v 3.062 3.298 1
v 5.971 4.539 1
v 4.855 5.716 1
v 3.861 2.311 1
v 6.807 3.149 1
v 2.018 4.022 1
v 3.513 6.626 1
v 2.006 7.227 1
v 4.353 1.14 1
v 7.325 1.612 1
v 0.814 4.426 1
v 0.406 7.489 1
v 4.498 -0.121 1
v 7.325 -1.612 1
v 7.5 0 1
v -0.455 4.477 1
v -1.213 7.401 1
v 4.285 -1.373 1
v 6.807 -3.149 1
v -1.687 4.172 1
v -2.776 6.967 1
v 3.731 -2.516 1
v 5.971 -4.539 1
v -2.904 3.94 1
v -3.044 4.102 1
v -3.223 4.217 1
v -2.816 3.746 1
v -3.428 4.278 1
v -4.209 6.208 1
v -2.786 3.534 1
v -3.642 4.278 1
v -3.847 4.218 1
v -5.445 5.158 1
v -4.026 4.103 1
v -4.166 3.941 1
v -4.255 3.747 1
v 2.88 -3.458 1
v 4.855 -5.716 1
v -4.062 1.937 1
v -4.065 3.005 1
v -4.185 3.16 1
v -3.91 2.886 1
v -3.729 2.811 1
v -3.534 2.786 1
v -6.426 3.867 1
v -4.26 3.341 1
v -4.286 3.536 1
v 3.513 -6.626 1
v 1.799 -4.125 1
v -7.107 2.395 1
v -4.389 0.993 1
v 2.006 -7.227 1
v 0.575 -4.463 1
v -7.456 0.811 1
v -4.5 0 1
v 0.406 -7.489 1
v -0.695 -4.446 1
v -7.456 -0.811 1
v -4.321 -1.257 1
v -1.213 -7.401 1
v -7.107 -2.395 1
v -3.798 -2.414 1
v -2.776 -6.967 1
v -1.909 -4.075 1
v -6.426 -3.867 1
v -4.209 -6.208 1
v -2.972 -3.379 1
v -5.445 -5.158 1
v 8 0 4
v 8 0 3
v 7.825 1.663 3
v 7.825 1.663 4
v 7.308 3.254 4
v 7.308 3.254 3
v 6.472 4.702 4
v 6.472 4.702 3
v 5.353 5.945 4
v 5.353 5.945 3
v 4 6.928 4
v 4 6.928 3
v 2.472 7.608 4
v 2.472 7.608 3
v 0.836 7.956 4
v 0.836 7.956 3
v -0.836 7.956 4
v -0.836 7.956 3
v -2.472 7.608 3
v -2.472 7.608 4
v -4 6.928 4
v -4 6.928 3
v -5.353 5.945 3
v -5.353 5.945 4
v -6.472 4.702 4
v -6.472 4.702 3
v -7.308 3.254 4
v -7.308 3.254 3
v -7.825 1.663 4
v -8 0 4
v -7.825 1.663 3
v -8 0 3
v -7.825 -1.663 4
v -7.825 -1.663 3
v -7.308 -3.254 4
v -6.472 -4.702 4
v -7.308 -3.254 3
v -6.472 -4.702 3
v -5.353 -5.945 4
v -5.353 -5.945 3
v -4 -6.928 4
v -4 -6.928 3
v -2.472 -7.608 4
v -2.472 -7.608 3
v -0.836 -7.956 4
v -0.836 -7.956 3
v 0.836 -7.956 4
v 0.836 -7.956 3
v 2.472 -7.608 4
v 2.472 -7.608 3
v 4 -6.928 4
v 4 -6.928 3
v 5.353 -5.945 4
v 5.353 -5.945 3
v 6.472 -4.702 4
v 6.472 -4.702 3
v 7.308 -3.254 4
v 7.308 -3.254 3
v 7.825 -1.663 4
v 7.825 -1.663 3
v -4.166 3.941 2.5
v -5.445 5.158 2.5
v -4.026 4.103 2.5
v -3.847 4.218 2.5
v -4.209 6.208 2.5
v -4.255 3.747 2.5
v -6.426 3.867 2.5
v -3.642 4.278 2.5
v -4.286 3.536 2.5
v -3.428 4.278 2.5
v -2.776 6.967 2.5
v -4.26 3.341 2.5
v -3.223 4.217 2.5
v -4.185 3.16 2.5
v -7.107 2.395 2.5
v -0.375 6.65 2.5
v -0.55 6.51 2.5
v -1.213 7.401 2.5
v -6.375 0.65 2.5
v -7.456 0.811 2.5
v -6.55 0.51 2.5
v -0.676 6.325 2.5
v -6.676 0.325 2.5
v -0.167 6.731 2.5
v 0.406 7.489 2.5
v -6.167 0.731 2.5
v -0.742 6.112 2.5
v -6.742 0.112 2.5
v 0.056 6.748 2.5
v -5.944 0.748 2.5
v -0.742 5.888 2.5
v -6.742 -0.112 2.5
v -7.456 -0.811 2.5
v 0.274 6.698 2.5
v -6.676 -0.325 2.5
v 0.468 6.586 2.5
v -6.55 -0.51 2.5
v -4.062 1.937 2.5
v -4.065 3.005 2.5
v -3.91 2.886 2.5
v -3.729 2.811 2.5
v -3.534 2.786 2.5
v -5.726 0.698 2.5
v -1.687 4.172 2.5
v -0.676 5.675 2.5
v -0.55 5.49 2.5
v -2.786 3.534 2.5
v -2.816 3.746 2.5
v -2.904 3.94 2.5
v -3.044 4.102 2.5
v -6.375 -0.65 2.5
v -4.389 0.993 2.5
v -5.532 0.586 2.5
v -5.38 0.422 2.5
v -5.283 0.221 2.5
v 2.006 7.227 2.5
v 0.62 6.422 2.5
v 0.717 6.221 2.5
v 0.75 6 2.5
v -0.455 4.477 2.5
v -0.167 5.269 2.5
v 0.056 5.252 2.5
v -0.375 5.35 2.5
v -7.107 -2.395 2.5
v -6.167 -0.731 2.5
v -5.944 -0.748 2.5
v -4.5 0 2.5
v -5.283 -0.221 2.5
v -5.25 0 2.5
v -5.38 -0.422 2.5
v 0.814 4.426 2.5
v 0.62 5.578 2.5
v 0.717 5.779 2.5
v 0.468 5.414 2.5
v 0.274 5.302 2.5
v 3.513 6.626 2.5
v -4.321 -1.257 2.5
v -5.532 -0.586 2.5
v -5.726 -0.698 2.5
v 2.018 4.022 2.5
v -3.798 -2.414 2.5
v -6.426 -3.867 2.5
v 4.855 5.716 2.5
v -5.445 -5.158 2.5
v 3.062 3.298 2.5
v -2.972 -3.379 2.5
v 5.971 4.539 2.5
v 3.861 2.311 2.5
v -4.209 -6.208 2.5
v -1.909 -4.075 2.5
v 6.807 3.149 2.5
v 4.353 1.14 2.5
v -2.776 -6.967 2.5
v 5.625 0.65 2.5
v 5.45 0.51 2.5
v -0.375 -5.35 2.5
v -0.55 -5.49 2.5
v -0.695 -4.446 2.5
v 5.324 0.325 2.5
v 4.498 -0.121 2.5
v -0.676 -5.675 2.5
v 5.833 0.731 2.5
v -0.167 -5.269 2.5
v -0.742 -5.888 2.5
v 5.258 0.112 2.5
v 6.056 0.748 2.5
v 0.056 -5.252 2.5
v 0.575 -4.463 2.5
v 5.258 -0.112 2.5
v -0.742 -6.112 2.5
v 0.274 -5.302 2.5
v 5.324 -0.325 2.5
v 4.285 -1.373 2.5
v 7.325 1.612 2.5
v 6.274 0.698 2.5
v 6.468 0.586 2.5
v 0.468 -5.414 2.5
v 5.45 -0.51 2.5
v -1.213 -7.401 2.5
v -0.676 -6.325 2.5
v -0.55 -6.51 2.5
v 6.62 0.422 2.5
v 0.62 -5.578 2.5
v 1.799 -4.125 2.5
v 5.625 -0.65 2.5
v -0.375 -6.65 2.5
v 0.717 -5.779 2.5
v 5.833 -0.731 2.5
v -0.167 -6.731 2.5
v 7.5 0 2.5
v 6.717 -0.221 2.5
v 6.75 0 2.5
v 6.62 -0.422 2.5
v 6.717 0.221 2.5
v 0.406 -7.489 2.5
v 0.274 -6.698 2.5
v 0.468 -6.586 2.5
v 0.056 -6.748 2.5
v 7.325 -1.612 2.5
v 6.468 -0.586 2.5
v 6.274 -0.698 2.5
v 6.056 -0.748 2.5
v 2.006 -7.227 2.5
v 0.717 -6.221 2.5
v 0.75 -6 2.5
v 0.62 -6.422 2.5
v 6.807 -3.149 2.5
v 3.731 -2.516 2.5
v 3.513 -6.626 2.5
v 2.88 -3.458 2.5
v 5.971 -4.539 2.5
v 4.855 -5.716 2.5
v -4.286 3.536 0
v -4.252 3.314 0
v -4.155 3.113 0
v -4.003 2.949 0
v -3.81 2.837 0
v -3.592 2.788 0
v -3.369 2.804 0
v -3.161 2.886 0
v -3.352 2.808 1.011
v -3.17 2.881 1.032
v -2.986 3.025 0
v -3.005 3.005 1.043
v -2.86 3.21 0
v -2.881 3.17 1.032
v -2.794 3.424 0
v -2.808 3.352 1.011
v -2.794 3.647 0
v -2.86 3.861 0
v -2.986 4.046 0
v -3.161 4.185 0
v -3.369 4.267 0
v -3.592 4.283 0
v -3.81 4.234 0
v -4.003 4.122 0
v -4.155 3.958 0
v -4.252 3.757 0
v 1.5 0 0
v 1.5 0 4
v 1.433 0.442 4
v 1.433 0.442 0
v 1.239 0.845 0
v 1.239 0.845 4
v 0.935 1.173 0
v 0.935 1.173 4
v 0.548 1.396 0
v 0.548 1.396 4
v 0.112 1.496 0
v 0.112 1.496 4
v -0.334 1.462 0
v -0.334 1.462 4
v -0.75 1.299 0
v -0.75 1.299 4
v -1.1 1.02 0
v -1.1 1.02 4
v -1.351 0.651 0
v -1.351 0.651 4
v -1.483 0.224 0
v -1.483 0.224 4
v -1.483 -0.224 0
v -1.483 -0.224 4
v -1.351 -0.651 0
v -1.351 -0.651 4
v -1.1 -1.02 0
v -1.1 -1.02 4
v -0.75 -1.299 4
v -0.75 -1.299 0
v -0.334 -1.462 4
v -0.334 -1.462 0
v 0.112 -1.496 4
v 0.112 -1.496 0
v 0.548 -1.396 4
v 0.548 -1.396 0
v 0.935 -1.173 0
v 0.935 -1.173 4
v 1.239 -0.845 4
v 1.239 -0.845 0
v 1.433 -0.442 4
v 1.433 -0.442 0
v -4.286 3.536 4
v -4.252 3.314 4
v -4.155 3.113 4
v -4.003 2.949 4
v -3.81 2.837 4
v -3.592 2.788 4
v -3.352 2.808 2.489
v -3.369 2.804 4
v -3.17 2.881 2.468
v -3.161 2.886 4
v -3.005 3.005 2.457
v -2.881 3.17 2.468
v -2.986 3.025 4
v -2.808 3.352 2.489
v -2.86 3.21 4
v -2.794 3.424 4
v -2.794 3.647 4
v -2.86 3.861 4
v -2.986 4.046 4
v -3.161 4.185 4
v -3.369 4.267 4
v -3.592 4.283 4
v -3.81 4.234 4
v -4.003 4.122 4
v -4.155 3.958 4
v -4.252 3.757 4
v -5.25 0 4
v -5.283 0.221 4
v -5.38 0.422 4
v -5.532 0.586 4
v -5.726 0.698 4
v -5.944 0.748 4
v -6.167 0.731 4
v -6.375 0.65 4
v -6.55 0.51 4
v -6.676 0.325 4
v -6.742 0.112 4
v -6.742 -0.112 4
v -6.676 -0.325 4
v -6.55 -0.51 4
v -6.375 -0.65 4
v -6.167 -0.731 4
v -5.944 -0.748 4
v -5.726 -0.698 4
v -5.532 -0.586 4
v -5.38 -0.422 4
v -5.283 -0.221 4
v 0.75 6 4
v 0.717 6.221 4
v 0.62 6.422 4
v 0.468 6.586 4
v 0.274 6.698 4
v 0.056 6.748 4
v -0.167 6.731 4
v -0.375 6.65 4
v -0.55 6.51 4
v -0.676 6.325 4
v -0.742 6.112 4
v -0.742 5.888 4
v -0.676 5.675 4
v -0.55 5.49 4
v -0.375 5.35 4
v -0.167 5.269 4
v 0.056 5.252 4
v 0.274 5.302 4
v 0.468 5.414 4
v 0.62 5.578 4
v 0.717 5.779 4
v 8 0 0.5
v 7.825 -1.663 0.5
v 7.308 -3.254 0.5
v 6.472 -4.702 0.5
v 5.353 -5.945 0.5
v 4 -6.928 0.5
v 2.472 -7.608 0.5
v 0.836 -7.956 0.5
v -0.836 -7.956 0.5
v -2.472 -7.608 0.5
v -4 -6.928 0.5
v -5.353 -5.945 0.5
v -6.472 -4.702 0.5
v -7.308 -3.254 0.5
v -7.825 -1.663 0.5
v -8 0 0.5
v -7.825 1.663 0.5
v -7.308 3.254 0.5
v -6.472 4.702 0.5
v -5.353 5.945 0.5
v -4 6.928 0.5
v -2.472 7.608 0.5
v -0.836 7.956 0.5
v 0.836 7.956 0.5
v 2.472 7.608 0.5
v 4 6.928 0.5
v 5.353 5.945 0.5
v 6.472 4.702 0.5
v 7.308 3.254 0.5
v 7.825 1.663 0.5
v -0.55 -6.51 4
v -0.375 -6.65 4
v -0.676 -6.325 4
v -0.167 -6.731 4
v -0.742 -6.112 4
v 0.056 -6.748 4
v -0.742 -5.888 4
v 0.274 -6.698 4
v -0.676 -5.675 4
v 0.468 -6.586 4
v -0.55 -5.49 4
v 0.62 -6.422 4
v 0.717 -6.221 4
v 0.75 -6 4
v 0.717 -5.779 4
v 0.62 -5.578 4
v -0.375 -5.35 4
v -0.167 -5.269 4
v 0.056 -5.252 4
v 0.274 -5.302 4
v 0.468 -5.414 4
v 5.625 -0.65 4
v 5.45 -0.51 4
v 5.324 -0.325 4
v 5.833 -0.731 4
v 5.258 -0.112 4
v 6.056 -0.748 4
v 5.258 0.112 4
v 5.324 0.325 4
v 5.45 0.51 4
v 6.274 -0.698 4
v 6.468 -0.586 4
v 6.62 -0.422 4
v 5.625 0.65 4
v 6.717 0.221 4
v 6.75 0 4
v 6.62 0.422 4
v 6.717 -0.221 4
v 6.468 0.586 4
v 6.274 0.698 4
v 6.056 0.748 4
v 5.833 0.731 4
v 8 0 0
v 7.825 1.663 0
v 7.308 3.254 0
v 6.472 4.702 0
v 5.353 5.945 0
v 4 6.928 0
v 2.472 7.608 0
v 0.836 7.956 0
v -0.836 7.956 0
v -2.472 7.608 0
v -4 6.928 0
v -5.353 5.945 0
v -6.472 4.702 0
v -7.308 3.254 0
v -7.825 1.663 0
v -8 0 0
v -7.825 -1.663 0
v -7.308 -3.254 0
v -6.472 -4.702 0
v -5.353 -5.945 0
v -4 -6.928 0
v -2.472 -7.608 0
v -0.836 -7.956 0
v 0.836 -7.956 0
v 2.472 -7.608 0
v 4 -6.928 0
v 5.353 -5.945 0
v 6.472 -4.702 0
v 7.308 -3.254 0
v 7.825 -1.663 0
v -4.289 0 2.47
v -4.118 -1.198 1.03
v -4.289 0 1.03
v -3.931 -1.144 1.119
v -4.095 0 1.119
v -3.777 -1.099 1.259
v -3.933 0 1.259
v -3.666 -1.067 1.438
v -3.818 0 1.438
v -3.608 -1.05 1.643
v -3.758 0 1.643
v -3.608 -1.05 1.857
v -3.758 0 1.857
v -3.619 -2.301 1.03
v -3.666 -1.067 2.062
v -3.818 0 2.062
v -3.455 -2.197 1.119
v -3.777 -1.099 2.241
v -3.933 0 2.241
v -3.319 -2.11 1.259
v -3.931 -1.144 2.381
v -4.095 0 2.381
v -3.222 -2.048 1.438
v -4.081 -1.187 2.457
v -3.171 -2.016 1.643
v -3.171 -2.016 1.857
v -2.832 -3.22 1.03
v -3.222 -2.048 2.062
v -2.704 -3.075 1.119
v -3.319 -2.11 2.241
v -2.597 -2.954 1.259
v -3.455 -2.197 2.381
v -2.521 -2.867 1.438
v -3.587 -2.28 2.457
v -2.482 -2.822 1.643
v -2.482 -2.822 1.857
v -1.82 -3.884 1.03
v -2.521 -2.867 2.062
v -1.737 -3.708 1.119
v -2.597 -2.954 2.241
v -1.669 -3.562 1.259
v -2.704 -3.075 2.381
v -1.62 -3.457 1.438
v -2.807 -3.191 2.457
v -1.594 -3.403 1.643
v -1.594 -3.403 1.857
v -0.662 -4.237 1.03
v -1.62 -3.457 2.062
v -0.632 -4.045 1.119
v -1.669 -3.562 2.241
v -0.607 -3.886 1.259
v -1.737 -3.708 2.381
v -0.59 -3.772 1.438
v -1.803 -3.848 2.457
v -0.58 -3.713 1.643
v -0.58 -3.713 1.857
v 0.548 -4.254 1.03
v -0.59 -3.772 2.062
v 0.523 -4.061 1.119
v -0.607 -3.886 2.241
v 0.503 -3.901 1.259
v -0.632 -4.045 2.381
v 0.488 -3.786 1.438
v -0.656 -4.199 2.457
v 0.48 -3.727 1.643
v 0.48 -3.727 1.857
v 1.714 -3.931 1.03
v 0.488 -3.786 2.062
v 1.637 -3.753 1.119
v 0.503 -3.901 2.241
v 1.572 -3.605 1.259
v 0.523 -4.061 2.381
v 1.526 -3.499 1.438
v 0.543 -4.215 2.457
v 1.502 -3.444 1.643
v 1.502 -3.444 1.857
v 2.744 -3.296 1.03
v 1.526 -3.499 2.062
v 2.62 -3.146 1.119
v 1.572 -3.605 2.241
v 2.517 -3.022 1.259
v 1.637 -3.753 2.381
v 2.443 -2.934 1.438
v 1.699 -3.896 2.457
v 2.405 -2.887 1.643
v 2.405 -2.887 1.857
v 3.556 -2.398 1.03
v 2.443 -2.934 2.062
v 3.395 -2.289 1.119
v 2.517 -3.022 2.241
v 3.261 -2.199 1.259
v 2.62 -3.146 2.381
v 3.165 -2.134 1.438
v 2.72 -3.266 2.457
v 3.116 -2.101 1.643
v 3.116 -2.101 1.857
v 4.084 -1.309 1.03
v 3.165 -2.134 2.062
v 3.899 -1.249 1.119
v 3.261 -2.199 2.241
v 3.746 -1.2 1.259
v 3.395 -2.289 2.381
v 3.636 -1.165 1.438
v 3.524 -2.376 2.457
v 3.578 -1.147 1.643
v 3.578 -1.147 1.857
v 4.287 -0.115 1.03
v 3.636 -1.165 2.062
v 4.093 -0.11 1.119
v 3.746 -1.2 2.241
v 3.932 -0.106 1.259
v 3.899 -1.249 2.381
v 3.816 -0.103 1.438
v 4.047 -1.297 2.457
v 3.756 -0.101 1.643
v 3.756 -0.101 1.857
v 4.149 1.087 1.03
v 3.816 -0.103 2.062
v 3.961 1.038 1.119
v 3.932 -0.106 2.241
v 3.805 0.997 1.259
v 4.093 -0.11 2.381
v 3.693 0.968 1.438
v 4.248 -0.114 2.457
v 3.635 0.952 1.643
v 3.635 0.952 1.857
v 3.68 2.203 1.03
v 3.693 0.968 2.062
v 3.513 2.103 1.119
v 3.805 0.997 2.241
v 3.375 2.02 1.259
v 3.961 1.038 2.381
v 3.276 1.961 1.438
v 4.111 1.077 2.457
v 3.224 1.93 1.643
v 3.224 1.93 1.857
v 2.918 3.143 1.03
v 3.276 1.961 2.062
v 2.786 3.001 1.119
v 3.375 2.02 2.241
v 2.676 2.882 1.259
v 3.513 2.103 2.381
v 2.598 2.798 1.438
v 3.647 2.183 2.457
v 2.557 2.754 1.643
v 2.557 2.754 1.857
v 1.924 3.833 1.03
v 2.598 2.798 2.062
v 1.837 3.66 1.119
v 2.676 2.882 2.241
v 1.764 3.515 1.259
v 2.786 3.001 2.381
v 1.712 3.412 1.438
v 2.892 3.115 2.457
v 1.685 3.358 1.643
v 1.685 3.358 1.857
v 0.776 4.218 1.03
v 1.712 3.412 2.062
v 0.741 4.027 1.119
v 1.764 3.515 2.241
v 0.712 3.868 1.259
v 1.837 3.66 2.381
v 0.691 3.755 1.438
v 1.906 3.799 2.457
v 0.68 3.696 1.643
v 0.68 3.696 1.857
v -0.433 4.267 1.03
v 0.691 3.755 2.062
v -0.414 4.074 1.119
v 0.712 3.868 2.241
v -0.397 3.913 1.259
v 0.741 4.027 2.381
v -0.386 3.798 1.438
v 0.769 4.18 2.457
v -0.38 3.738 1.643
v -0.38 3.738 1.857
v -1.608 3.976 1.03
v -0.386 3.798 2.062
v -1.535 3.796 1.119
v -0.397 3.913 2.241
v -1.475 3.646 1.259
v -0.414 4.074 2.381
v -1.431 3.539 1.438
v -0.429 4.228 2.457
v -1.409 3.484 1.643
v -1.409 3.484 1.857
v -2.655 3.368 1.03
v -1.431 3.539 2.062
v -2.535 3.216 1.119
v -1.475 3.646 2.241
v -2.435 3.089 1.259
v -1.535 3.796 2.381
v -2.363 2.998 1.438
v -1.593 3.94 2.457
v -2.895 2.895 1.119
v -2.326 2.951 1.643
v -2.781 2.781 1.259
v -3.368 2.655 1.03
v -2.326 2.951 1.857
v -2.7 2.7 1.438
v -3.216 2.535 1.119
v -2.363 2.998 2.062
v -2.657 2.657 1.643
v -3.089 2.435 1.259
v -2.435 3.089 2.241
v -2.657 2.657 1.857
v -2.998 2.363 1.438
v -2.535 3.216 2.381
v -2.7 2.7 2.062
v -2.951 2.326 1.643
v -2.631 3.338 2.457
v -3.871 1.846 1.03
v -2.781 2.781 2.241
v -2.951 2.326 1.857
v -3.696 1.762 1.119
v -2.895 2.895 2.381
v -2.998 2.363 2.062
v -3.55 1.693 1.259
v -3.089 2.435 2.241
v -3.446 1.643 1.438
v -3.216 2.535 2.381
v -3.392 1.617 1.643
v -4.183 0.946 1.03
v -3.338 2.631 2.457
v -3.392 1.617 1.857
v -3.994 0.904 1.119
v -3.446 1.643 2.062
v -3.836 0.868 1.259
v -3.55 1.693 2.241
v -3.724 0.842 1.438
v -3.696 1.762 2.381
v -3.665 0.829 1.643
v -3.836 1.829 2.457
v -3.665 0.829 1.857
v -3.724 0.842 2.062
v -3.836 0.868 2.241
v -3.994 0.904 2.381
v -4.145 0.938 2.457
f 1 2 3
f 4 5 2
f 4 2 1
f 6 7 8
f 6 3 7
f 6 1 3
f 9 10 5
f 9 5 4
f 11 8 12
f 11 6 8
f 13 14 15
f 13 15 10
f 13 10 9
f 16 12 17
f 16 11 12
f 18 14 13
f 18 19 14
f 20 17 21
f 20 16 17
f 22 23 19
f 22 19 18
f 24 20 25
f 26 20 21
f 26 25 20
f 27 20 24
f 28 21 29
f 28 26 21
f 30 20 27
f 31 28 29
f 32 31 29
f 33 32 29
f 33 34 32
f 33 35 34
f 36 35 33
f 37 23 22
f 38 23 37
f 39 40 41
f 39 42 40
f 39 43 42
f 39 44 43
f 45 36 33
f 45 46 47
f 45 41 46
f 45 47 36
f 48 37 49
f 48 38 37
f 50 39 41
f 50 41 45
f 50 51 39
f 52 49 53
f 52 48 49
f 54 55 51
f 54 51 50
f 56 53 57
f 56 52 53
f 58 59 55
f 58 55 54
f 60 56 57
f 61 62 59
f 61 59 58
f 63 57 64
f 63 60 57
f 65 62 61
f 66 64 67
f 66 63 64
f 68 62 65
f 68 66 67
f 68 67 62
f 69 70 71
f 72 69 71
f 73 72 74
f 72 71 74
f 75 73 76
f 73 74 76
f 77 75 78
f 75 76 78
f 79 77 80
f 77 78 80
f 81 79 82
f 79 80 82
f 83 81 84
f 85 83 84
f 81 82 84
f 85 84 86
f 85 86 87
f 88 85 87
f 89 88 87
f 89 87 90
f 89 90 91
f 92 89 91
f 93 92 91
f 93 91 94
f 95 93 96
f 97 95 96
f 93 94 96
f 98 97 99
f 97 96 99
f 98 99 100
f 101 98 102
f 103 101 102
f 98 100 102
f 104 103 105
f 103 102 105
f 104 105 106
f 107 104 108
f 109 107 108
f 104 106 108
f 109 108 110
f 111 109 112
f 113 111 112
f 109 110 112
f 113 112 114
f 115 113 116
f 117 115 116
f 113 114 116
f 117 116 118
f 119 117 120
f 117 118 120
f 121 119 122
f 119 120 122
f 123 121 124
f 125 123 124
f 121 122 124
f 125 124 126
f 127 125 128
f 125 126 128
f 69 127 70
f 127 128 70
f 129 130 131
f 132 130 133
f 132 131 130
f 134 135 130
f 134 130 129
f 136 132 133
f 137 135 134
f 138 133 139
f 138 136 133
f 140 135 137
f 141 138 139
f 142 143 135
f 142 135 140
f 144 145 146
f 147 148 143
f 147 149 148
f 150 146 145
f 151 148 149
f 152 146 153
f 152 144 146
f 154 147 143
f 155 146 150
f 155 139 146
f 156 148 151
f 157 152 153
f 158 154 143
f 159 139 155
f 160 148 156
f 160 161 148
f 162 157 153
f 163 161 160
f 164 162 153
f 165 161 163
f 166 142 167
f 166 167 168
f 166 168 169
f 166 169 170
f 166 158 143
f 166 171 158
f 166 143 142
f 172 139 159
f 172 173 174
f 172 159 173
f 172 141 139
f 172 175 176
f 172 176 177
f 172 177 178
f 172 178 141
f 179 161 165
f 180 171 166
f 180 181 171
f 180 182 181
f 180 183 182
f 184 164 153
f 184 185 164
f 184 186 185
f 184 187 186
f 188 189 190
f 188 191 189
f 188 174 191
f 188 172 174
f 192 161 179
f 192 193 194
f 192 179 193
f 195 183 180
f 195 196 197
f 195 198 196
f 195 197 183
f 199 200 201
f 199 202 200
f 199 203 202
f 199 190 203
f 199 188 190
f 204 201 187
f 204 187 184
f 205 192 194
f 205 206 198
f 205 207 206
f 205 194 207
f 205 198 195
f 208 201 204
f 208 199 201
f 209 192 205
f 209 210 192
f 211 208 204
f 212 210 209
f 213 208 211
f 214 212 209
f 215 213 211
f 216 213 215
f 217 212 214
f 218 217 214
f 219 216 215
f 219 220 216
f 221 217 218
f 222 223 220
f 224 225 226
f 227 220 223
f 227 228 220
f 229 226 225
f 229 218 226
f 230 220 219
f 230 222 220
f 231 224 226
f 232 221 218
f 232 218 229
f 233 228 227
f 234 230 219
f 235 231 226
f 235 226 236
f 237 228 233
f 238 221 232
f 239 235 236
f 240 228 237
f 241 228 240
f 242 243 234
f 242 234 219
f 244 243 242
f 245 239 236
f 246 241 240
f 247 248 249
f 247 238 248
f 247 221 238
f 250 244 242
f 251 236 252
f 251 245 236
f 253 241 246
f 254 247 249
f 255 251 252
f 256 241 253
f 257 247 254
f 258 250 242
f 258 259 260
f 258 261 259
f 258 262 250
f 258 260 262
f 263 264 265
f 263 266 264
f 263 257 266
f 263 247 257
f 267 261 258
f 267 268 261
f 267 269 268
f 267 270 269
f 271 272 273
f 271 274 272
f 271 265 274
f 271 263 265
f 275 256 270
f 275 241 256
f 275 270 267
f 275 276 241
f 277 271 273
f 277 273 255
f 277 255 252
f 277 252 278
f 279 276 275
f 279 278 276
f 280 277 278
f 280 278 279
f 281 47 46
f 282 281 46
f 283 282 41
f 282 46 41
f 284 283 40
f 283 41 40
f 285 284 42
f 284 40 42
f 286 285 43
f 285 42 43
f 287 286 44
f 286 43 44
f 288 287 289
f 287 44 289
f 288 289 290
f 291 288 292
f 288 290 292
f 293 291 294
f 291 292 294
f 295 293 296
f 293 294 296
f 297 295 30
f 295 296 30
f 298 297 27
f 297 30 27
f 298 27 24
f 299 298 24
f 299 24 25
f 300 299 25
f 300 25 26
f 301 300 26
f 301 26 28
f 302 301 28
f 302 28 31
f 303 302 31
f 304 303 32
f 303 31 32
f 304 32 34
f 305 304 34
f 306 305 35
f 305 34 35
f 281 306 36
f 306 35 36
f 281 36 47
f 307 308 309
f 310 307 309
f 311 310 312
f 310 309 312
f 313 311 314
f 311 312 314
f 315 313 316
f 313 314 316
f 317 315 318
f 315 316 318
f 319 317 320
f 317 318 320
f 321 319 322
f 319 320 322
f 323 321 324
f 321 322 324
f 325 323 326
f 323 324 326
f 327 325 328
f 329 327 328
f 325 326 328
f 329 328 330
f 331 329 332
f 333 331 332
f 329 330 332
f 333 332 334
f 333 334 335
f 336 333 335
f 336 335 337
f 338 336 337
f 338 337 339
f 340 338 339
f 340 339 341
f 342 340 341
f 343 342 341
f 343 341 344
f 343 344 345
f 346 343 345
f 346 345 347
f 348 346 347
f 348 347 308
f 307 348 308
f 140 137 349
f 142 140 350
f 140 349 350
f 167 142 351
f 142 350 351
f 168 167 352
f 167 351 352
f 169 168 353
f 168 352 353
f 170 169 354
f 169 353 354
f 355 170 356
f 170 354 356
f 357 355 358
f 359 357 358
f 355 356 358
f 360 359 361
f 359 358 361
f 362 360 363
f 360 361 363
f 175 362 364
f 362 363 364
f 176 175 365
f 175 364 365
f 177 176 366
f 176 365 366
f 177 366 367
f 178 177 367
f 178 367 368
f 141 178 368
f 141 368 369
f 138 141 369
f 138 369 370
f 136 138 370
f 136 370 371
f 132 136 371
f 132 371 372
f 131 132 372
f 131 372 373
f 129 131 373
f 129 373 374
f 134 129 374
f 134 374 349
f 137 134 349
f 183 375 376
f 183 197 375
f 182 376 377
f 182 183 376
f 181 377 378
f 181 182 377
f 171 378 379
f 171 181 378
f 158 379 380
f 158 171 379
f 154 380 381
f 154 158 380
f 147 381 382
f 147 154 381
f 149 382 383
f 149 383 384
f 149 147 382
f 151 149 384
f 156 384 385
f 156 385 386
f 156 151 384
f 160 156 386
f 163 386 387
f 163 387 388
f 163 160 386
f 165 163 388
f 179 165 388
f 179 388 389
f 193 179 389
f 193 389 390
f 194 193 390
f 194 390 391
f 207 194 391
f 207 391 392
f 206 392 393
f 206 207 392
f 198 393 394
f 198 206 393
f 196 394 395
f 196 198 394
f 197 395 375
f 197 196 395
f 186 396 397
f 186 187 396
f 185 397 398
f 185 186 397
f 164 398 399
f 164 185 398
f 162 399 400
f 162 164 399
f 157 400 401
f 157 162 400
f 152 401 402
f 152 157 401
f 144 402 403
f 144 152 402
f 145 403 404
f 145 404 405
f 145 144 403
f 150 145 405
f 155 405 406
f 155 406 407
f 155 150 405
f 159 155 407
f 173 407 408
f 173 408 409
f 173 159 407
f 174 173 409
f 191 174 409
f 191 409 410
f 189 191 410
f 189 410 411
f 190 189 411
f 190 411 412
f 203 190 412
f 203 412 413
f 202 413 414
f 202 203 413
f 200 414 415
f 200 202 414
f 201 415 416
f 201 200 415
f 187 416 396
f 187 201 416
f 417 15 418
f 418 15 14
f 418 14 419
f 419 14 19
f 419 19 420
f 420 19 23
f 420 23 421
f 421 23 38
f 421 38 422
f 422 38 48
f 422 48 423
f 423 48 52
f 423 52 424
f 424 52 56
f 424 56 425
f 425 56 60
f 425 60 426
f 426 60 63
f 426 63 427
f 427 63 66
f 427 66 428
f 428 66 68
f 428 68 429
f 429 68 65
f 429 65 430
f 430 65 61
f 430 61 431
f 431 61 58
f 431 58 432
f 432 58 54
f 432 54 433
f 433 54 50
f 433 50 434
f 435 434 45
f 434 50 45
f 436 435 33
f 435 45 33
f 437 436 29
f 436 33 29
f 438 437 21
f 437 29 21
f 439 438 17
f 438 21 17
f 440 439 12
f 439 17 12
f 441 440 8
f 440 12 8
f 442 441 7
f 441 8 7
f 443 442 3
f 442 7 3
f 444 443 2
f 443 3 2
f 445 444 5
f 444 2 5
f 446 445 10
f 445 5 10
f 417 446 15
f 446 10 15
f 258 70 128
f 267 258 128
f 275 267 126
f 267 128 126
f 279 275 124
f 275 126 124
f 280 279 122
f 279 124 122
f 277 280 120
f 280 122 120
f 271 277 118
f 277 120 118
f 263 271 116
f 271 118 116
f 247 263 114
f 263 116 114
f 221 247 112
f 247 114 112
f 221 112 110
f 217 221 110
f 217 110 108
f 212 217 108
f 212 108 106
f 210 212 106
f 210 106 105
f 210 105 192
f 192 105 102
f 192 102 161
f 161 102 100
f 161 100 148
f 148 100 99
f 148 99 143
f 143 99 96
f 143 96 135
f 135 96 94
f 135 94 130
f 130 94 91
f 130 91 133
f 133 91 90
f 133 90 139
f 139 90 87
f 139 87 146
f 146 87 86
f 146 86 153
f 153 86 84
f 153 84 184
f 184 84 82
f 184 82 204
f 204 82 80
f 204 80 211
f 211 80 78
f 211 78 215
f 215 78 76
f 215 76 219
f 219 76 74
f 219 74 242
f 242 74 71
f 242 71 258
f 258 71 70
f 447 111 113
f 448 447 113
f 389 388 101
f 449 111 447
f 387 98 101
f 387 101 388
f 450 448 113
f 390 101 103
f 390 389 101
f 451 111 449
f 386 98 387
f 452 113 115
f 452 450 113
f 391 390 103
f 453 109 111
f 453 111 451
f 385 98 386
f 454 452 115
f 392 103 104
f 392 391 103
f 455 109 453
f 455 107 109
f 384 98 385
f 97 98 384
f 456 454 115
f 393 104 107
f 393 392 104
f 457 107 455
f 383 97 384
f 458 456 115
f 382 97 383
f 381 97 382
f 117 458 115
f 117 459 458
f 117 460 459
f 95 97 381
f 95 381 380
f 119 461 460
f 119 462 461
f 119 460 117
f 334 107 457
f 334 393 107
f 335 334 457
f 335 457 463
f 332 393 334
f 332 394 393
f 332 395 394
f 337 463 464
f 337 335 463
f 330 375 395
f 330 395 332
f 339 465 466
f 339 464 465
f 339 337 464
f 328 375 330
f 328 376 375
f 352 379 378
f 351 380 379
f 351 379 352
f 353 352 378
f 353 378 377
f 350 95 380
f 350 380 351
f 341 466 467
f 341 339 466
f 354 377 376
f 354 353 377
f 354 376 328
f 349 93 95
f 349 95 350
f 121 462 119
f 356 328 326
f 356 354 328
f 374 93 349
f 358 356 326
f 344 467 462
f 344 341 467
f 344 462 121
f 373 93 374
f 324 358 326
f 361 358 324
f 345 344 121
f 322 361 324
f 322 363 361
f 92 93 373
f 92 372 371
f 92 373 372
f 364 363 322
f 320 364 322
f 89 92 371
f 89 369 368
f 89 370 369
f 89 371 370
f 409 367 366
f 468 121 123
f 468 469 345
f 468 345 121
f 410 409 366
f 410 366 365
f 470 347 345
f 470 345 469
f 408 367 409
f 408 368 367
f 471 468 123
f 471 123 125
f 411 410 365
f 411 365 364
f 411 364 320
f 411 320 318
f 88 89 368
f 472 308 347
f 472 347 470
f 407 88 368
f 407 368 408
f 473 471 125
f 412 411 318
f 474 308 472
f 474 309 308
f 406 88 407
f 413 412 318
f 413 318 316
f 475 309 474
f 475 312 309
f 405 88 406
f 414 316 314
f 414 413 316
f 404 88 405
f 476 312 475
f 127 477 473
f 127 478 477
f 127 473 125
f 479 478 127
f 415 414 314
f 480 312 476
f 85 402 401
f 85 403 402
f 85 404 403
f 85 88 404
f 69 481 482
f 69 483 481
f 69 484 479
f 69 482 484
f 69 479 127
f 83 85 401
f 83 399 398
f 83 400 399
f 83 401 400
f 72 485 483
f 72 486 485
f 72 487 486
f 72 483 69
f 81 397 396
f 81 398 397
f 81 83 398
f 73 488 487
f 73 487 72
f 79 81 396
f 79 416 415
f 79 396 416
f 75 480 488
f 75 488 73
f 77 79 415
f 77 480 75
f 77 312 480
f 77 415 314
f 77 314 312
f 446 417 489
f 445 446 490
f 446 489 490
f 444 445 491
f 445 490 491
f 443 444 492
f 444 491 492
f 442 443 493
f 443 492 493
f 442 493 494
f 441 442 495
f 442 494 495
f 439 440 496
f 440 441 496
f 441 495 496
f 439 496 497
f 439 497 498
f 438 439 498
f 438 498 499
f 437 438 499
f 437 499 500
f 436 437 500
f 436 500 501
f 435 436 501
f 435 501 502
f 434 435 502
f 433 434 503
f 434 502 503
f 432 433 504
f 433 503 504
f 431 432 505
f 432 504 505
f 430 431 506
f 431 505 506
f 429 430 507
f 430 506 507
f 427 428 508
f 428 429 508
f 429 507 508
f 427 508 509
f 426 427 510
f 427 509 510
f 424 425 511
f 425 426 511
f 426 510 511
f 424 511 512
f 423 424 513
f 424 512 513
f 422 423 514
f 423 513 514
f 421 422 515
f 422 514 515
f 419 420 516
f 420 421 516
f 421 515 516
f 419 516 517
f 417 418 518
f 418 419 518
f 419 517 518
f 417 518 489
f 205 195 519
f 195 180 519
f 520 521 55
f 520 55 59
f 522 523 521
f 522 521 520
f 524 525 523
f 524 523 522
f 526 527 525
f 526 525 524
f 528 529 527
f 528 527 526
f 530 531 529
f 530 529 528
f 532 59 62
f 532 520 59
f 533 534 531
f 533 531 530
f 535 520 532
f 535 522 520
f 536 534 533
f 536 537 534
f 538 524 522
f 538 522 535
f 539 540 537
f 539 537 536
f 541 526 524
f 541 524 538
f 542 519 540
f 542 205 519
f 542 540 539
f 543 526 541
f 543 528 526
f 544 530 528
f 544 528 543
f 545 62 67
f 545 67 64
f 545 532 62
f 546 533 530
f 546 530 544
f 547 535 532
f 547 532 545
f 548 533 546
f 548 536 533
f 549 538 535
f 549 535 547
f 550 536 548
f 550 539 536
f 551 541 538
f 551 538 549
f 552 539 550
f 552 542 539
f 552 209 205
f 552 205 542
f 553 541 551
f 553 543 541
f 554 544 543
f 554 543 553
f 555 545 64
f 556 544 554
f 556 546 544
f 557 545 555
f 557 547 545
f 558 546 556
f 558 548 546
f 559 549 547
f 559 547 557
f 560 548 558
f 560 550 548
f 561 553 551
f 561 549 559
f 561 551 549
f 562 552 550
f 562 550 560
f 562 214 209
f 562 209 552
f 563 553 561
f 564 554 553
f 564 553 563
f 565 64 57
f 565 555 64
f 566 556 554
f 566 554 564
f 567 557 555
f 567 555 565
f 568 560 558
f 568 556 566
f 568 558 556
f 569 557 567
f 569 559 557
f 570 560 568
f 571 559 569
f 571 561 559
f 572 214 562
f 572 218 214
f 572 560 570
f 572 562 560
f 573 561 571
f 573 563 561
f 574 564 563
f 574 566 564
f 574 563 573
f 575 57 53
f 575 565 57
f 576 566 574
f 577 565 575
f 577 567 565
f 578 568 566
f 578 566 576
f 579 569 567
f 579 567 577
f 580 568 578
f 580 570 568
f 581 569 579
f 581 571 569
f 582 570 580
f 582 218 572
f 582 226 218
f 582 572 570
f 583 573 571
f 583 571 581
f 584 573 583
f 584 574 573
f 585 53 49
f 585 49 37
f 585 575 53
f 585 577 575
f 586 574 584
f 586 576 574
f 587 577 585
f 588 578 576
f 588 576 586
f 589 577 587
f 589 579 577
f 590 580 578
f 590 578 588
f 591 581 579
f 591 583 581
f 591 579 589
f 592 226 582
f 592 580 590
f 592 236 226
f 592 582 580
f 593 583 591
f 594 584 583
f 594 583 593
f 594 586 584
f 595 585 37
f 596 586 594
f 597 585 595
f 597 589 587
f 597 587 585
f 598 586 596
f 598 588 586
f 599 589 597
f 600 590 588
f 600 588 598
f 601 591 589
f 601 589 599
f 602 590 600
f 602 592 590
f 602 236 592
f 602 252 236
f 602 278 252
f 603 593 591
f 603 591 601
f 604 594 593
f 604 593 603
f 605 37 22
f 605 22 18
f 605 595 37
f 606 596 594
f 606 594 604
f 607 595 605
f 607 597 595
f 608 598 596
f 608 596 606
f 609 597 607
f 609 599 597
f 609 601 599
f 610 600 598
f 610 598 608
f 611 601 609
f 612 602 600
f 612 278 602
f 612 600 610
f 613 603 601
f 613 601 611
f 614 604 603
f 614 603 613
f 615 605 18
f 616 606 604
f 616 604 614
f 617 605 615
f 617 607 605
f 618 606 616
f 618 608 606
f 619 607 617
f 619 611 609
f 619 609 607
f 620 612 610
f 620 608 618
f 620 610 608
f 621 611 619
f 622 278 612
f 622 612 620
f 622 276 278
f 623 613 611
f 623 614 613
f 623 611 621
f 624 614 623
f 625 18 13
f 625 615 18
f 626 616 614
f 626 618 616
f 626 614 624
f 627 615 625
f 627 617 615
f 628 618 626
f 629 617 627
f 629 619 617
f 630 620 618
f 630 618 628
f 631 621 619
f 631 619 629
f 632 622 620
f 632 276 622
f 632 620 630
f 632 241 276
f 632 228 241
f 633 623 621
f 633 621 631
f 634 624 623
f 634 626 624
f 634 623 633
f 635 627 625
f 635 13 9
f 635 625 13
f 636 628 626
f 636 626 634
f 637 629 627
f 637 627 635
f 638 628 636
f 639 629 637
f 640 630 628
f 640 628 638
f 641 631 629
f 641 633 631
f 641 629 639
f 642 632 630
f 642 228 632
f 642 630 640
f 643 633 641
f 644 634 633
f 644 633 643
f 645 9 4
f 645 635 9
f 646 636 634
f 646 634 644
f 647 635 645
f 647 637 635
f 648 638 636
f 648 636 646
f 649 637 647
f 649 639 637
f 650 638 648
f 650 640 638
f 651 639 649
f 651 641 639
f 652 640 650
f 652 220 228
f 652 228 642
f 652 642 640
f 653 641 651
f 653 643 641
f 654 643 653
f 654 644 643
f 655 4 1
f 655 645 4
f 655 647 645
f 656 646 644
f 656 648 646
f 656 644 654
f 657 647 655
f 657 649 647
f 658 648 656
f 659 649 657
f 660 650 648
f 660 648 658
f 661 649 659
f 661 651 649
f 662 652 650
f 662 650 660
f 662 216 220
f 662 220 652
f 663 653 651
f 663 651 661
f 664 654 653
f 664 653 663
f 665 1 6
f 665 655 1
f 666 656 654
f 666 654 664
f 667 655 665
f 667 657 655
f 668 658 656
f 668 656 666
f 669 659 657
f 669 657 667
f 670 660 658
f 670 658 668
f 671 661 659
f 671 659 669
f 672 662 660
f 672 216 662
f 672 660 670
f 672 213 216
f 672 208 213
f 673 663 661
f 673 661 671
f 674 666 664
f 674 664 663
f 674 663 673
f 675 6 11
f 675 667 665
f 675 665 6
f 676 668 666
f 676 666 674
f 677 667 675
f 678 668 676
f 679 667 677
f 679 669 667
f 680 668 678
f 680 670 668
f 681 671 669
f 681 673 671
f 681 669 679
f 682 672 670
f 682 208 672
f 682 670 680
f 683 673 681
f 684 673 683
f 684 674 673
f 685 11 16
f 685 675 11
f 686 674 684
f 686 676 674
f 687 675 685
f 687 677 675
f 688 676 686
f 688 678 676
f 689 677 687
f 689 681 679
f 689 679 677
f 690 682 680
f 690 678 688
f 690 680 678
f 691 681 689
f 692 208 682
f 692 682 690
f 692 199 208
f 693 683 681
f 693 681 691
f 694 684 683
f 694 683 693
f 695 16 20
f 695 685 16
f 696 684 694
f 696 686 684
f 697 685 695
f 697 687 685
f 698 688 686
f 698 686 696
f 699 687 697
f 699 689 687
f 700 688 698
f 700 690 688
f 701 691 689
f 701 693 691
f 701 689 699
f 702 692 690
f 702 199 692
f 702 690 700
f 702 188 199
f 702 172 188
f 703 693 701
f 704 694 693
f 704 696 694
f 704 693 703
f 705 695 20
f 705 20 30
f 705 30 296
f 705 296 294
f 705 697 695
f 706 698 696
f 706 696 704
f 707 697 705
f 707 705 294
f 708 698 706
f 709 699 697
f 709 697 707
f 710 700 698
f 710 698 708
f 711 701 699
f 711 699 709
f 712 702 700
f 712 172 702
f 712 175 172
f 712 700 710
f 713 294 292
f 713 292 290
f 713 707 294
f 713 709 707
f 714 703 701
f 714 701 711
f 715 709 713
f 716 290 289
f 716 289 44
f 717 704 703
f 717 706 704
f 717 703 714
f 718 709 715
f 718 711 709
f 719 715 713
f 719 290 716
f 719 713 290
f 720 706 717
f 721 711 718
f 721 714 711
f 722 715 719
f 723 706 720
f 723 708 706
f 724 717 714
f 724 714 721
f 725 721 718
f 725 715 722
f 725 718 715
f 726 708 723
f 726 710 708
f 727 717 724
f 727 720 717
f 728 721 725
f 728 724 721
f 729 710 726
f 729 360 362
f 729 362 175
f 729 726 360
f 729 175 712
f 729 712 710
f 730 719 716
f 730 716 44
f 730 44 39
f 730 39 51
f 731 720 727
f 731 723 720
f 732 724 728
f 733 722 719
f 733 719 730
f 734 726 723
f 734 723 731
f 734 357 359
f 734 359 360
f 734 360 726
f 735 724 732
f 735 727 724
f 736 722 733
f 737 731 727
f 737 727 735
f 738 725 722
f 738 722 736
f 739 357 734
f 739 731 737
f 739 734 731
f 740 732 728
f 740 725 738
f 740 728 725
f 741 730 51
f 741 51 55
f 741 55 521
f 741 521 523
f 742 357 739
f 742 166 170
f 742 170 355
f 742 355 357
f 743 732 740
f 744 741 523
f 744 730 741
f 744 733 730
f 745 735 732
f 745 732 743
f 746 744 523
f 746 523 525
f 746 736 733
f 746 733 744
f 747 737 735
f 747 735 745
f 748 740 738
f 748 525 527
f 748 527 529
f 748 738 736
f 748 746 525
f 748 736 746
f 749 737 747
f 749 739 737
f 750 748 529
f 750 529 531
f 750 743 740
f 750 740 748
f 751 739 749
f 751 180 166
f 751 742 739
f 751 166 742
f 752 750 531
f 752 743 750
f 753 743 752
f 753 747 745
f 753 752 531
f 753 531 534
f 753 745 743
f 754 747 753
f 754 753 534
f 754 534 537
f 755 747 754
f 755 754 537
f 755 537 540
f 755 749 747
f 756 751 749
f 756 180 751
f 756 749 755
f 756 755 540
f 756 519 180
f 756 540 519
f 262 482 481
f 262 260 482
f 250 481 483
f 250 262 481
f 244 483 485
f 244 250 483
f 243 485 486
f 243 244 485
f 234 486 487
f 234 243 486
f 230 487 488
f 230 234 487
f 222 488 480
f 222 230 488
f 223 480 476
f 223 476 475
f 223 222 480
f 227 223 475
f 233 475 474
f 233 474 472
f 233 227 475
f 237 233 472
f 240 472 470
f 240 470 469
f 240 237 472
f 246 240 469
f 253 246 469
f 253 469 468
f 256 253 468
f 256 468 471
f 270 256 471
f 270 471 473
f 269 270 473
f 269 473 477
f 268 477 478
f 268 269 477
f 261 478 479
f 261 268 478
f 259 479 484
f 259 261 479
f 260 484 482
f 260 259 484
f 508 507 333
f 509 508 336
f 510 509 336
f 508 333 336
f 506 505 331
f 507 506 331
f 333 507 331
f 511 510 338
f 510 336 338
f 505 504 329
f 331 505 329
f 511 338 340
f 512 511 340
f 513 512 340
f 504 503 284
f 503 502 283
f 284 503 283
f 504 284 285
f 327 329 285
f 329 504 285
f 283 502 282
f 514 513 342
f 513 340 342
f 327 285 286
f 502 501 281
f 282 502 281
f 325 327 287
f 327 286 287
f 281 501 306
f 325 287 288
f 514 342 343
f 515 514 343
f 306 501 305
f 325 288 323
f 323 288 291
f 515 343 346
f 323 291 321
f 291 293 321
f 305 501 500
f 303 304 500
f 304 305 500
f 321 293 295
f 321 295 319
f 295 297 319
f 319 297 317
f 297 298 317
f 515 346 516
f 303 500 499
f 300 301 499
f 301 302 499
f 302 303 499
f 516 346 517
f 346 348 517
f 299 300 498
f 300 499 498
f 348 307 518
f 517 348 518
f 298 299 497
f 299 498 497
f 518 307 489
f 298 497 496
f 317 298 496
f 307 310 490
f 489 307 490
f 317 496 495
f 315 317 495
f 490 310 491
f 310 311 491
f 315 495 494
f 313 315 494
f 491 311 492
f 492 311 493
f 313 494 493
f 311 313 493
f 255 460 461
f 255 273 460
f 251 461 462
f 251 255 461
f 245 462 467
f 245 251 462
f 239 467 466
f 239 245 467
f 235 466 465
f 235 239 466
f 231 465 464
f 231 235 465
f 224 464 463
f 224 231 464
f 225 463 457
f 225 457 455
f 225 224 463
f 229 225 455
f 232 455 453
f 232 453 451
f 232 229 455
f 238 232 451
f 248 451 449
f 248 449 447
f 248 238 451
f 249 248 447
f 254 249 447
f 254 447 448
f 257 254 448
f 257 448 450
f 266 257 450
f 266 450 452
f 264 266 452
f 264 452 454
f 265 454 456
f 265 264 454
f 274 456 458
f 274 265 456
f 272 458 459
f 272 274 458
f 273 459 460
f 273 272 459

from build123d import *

# Parameters (mm, degrees)
SKIZZE2_R                        = 8
AUFSATZ_LINEAR_AUSTRAGEN1_DEPTH  = 4
F_3_0_3_DURCHMESSER_BOHRUNG1_D   = 3
SKIZZE8_R                        = 0.75
AUFSATZ_LINEAR_AUSTRAGEN2_DEPTH  = 2
F_1_5_1_5_DURCHMESSER_BOHRUNG1_D = 1.5
FASE1_SIZE                       = 0.5
FASE2_SIZE                       = 0.3
SKIZZE16_R                       = 0.75
SCHNITT_LINEAR_AUSTRAGEN1_DEPTH  = 5


with BuildPart() as part:
    # Skizze2 → Aufsatz-Linear austragen1 (new body)
    with BuildSketch(Plane.XY):
        Circle(SKIZZE2_R)
    extrude(amount=AUFSATZ_LINEAR_AUSTRAGEN1_DEPTH)

    # Ø3.0 (3) Durchmesser Bohrung1 (through all)
    with Locations(Plane(origin=(0, 0, 0), x_dir=(-1, 0, 0), z_dir=(0, 0, -1))):
        with Locations((0, 0)):
            Hole(F_3_0_3_DURCHMESSER_BOHRUNG1_D / 2)

    # Skizze9 → Schnitt-Rotation2 (revolve, cut)
    with BuildSketch(Plane(origin=(0, 0, 0), x_dir=(1, 0, 0), z_dir=(0, 1, 0))):
        with BuildLine():
            Line((-4.5, -2.5), (-8, -2.5))
            Line((-8, -2.5), (-8, -1))
            Line((-8, -1), (-4.5, -1))
            ThreePointArc((-4.5, -1), (-3.75, -1.75), (-4.5, -2.5))
        make_face()
    revolve(axis=Axis((0, 0, 0), (0, 0, 1)), mode=Mode.SUBTRACT)

    # Skizze8 → Aufsatz-Linear austragen2 (add)
    with BuildSketch(Plane.XY.offset(4)):
        with Locations((0, 6)):
            Circle(SKIZZE8_R)
        with Locations((6, 0)):
            Circle(SKIZZE8_R)
        with Locations((0, -6)):
            Circle(SKIZZE8_R)
        with Locations((-6, 0)):
            Circle(SKIZZE8_R)
    extrude(amount=AUFSATZ_LINEAR_AUSTRAGEN2_DEPTH)

    # Ø1.5 (1.5) Durchmesser Bohrung1 (through all)
    with Locations(Plane(origin=(0, 0, 0), x_dir=(1, 0, 0), z_dir=(0, 0, -1))):
        with Locations((-3.535533906, -3.535533906)):
            Hole(F_1_5_1_5_DURCHMESSER_BOHRUNG1_D / 2)

    # Fase1
    fase1_edges = [part.edges().sort_by_distance(p)[0] for p in [
        (-8, 0, 2.5),
        (-8, 0, 1),
    ]]
    chamfer(fase1_edges, length=FASE1_SIZE)

    # Fase2
    fase2_edges = [part.edges().sort_by_distance(p)[0] for p in [
        (-0.75, 6, 6),
        (5.25, 0, 6),
        (-0.75, -6, 6),
        (-6.75, 0, 6),
    ]]
    chamfer(fase2_edges, length=FASE2_SIZE)

    # Skizze16 → Schnitt-Linear austragen1 (cut)
    with BuildSketch(Plane.XY.offset(2)):
        with Locations((0, 6)):
            Circle(SKIZZE16_R)
        with Locations((6, 0)):
            Circle(SKIZZE16_R)
        with Locations((0, -6)):
            Circle(SKIZZE16_R)
        with Locations((-6, 0)):
            Circle(SKIZZE16_R)
    extrude(amount=SCHNITT_LINEAR_AUSTRAGEN1_DEPTH, mode=Mode.SUBTRACT)


solid = part.part
